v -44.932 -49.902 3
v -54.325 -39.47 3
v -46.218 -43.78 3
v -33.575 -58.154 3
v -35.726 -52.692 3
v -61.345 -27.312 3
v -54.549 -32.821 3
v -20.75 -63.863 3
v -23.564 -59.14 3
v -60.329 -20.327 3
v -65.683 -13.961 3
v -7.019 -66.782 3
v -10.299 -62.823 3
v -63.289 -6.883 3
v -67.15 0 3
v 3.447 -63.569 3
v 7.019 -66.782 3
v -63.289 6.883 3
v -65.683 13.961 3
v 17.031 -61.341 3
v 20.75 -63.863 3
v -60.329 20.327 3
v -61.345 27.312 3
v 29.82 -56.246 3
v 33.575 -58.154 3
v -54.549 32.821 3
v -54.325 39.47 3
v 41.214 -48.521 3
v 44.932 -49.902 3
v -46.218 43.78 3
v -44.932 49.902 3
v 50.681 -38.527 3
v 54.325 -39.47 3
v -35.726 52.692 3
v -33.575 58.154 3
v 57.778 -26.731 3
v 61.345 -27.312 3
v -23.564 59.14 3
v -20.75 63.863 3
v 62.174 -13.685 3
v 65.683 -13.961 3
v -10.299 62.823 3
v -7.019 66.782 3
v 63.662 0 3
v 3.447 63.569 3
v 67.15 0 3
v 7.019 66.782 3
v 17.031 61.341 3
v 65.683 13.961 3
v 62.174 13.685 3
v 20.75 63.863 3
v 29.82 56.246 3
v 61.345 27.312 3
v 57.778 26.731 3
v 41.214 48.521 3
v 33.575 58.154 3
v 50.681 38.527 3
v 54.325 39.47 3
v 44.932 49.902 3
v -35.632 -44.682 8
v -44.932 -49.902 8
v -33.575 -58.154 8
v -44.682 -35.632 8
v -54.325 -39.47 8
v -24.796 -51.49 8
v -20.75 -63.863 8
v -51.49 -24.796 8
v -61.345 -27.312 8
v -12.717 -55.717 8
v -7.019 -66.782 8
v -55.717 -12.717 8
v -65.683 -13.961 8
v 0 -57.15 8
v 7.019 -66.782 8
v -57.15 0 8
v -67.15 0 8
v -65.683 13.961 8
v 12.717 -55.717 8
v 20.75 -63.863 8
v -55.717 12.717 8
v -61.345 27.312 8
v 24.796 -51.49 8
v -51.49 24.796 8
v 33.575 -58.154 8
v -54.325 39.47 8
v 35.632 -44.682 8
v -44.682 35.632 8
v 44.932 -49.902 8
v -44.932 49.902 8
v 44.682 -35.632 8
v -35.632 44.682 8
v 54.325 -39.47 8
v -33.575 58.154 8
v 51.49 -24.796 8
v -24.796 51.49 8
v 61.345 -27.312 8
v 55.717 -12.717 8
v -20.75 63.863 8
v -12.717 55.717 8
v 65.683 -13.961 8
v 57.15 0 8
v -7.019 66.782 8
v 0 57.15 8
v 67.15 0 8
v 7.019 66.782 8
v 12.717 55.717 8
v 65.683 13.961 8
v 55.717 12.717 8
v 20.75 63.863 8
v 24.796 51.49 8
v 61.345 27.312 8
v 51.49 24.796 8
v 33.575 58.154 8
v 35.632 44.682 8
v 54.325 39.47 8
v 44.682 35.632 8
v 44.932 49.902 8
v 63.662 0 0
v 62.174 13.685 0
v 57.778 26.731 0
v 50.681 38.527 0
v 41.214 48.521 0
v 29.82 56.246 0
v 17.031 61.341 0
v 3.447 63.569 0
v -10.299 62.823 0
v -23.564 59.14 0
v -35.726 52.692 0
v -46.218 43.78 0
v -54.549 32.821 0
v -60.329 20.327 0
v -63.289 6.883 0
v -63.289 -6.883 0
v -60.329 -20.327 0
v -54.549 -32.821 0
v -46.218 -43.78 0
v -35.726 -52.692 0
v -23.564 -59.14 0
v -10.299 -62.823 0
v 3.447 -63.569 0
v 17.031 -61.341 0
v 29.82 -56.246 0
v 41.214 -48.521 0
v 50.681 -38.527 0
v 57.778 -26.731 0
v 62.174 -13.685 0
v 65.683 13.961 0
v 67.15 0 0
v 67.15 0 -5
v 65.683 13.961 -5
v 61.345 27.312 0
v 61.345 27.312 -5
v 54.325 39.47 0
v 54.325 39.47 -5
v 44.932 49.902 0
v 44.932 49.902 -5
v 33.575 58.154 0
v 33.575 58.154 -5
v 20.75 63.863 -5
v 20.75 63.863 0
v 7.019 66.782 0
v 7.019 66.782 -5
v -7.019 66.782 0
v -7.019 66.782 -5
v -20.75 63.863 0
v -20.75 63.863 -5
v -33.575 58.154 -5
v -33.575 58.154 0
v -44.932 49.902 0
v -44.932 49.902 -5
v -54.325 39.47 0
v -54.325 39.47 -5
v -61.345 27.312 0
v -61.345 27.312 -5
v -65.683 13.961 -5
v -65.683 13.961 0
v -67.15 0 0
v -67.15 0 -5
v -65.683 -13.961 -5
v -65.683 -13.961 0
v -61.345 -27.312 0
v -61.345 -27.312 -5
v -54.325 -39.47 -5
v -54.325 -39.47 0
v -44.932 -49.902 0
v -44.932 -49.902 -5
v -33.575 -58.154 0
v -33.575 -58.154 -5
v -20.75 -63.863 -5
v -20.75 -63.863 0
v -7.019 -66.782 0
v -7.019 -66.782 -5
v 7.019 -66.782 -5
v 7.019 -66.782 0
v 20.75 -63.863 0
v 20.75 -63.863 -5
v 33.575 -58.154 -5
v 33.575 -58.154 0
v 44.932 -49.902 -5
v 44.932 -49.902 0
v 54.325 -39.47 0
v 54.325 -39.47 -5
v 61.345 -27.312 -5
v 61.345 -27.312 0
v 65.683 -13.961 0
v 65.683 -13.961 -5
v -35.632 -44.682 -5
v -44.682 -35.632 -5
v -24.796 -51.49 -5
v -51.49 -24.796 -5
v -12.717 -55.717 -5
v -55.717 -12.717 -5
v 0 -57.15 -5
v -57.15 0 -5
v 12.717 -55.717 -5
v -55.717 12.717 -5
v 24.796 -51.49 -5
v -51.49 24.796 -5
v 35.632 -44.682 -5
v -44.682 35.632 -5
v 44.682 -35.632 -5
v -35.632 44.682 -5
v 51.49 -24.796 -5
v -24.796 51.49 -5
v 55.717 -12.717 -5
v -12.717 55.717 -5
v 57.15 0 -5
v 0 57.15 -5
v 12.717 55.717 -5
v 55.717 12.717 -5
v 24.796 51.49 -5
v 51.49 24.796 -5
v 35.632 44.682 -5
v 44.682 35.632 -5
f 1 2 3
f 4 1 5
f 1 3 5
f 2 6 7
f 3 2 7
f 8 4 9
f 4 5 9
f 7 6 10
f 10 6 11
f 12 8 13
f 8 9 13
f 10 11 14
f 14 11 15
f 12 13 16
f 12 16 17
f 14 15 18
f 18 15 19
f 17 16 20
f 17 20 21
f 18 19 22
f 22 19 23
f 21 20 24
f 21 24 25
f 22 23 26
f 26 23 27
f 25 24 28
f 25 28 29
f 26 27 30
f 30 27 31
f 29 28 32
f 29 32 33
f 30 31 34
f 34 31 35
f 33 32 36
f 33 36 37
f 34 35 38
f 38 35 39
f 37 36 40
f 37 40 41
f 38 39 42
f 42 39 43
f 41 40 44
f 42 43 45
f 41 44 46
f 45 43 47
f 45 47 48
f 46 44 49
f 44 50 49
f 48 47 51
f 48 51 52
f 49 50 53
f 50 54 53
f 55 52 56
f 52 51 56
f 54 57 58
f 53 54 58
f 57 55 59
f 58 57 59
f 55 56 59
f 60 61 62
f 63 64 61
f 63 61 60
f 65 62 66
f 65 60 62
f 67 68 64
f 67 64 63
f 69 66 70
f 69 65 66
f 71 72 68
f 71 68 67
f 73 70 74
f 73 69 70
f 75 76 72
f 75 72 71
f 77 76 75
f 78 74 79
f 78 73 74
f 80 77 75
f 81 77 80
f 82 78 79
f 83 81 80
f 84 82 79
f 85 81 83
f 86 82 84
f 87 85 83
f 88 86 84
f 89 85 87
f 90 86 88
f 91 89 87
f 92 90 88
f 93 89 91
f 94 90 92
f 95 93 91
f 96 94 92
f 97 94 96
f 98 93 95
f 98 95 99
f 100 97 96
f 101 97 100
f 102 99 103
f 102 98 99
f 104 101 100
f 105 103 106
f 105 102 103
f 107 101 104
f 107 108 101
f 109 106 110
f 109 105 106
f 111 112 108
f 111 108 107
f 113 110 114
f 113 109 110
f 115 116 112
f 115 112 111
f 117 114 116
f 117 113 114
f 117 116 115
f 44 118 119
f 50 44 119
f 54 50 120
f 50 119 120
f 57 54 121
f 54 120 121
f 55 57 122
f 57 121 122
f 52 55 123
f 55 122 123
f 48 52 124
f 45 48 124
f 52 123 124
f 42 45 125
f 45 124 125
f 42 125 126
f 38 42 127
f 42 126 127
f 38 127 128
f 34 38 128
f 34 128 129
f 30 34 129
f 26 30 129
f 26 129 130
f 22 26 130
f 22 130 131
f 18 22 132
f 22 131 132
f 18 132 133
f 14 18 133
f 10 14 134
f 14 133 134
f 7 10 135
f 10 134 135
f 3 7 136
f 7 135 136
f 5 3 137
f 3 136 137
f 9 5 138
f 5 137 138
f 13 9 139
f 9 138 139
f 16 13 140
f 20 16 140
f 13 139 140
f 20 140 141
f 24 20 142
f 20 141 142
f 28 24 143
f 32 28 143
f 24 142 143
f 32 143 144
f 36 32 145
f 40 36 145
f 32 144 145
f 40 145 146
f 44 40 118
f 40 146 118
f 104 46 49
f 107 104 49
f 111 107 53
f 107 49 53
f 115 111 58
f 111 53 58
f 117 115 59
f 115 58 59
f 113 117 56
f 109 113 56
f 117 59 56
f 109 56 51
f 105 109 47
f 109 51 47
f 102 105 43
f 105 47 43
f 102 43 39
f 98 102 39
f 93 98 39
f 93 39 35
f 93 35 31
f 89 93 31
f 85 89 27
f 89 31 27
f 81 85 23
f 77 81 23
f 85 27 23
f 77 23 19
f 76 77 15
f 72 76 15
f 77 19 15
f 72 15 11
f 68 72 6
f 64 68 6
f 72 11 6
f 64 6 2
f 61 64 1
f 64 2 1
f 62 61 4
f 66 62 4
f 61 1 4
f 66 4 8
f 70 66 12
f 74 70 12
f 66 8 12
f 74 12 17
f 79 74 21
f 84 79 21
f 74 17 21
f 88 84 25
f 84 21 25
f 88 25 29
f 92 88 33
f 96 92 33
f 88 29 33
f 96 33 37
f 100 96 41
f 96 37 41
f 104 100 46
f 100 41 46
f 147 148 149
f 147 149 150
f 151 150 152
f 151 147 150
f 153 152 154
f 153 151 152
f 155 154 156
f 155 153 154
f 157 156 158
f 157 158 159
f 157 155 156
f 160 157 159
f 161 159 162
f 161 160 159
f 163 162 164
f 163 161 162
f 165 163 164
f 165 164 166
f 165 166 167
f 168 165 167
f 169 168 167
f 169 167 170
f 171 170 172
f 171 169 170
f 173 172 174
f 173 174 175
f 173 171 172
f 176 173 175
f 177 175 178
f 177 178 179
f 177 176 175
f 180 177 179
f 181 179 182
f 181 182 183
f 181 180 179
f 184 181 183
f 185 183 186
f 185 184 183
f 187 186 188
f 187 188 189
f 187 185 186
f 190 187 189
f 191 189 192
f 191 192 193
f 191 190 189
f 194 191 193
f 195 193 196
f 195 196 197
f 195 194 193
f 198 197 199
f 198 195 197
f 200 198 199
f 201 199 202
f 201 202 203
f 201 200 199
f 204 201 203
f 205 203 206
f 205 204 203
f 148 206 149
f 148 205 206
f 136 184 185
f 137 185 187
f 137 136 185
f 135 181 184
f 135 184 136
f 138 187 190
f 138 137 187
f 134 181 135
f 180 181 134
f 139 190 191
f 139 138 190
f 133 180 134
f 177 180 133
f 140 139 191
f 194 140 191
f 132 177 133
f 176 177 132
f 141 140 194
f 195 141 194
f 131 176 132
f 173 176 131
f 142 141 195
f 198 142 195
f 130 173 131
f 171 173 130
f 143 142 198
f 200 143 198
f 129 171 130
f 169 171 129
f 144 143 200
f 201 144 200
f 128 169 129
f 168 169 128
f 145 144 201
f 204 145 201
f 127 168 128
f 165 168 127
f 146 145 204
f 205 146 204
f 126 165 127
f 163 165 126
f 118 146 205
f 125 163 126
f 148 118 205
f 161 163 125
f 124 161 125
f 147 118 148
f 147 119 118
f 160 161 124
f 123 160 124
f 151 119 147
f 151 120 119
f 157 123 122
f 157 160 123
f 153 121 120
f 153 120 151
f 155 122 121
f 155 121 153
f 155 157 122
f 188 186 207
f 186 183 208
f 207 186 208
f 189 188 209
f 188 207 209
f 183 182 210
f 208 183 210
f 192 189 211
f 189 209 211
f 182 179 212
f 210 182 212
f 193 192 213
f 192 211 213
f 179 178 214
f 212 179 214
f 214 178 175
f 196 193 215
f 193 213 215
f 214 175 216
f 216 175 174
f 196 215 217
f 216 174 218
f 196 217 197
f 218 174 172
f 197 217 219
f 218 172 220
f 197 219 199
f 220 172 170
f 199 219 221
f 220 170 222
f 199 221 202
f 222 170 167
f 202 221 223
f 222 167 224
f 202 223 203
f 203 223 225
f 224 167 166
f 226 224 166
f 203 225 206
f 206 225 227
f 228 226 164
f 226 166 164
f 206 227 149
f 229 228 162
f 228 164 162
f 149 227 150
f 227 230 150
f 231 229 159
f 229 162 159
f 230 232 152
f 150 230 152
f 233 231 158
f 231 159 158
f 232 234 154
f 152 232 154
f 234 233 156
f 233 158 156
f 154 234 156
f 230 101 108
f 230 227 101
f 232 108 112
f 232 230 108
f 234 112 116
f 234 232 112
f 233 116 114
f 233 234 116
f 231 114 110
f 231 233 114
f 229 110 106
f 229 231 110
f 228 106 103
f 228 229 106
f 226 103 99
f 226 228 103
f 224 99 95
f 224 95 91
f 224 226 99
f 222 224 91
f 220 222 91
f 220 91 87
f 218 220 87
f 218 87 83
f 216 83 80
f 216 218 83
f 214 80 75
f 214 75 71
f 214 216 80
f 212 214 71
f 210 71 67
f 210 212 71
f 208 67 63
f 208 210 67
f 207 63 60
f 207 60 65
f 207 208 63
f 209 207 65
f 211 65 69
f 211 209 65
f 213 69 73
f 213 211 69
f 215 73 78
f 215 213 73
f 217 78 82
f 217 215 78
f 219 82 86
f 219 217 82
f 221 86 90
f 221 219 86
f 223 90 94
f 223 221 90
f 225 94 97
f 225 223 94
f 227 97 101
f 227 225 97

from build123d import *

# Parameters (mm, degrees)
F0_R     = 63.6619772368
F0_R_2   = 57.15
F1_DEPTH = 3
F2_R     = 67.15
F2_R_2   = 63.6619772368
F3_DEPTH = 5
F4_R     = 67.15
F4_R_2   = 63.6619772368
F4_R_3   = 57.15
F5_DEPTH = 5


with BuildPart() as f1:
    # F0 (on Top) → F1 (new body)
    with BuildSketch(Plane.XY):
        Circle(F0_R)
        Circle(F0_R_2, mode=Mode.SUBTRACT)
    extrude(amount=F1_DEPTH)

    # F2 (on face) + F0 (on Top) → F3 (join)
    with BuildSketch(Plane.XY):
        Circle(F2_R)
        Circle(F2_R_2, mode=Mode.SUBTRACT)
    with BuildSketch(Plane.XY):
        Circle(F0_R)
        Circle(F0_R_2, mode=Mode.SUBTRACT)
    extrude(amount=-F3_DEPTH)

    # F4 (on face) → F5 (join)
    with BuildSketch(Plane.XY.offset(3)):
        Circle(F4_R)
        Circle(F4_R_2, mode=Mode.SUBTRACT)
        Circle(F4_R_2)
        Circle(F4_R_3, mode=Mode.SUBTRACT)
    extrude(amount=F5_DEPTH)


solid = f1.part
